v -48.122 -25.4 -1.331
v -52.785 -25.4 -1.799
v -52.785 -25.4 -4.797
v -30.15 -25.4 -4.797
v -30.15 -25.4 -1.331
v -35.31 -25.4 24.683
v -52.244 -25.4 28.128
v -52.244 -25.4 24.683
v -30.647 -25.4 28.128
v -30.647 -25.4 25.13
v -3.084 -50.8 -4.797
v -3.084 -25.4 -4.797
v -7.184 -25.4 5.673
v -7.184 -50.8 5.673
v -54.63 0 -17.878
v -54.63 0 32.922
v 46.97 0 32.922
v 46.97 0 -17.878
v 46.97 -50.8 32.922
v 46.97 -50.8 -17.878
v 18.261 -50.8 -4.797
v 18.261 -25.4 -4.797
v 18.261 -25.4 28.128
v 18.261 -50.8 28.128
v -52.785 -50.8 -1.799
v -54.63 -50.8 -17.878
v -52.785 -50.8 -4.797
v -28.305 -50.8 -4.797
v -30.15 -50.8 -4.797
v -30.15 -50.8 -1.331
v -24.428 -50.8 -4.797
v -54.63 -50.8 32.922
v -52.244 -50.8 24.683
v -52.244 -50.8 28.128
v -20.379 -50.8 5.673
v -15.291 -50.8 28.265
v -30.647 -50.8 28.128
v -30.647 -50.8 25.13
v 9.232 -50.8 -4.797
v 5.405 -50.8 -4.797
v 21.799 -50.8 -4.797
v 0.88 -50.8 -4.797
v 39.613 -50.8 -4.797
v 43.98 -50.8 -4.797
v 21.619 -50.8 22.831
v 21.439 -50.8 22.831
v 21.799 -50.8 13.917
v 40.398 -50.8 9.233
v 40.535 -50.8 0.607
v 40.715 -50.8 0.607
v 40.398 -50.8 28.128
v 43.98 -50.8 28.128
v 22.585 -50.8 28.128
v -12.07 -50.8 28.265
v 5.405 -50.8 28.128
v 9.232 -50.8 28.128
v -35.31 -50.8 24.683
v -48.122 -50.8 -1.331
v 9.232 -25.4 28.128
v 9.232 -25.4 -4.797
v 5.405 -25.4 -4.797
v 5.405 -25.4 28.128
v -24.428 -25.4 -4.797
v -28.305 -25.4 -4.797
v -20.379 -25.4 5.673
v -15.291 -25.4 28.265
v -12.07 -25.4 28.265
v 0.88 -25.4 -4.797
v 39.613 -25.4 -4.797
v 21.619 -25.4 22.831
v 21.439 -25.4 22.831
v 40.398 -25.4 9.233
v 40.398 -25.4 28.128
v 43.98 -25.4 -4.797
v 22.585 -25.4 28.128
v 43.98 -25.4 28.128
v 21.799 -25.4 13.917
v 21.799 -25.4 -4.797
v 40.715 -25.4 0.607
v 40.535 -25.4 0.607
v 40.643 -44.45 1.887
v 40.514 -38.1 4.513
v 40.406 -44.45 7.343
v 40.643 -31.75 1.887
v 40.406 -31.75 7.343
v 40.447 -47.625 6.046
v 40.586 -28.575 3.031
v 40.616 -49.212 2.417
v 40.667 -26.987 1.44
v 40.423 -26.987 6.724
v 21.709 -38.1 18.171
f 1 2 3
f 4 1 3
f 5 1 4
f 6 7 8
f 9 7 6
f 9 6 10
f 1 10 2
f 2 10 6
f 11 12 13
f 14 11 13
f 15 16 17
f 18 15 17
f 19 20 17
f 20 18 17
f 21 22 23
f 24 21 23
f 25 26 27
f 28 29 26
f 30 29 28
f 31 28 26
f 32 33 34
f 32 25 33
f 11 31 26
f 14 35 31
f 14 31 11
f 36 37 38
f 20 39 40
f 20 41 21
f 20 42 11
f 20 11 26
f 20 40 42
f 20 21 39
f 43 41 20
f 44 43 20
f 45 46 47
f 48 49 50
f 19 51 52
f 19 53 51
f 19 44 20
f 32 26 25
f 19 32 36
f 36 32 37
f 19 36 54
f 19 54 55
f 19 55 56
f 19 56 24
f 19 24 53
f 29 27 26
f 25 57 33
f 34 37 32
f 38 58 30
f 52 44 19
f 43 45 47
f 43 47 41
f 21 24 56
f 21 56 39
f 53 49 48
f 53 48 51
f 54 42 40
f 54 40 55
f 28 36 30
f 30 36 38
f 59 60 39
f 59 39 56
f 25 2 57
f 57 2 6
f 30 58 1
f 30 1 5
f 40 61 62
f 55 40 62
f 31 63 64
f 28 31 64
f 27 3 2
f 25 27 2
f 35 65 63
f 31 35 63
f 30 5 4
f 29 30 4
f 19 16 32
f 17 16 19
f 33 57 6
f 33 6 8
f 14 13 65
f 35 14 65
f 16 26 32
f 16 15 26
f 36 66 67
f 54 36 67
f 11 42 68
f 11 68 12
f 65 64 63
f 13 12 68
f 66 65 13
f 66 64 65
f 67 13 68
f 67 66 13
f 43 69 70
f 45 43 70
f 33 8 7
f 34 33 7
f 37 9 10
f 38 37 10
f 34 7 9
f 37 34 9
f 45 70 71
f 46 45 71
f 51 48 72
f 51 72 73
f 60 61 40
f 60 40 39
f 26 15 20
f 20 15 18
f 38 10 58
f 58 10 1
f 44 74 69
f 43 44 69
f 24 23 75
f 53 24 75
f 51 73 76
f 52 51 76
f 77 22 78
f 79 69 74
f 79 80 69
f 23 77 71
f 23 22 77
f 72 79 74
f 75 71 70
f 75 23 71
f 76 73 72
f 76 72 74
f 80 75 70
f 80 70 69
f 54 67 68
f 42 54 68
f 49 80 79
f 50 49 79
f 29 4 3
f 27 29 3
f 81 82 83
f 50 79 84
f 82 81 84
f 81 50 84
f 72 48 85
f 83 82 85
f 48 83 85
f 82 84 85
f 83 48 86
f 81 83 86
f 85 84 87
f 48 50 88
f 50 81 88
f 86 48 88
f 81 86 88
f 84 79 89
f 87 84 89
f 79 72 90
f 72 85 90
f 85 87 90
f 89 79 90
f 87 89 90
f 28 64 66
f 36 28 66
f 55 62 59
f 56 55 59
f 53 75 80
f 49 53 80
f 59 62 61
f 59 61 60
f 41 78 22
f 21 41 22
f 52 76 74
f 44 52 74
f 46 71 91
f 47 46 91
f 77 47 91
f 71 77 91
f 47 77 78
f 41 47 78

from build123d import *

# Parameters (mm, degrees)
F0_W     = 101.6
F0_H     = 50.8000018598
F1_DEPTH = 25.4
F2_W     = 101.6
F2_H     = 50.8000018598
F2_W_2   = 3.8264841478
F2_H_2   = 32.9250585148
F3_DEPTH = 25.4


with BuildPart() as f1:
    # F0 (on Front) → F1 (new body)
    with BuildSketch(Plane.XZ):
        with Locations((-3.8295406848, 7.522309199)):
            Rectangle(F0_W, F0_H)
    extrude(amount=F1_DEPTH)

    # F2 (on face) → F3 (join)
    with BuildSketch(Plane.XZ.offset(25.4)):
        with Locations((-3.8295406848, 7.522309199)):
            Rectangle(F2_W, F2_H)
        Polygon((-30.1501307976, -1.3310039), (-30.1501307976, -4.797178806), (-52.7847573669, -4.797178806), (-52.7847573669, -1.7994059143), (-35.30975914, 24.6833233572), (-52.2442935042, 24.6833233572), (-52.2442935042, 28.1278797087), (-30.6473575513, 28.1278797087), (-30.6473575513, 25.1301068171), (-48.1223557781, -1.3310039), align=None, mode=Mode.SUBTRACT)
        Polygon((0.8797011054, -4.797178806), (-3.0837005543, -4.797178806), (-7.1840197259, 5.6734077604), (-20.3785441602, 5.6734077604), (-24.428420038, -4.797178806), (-28.3053474796, -4.797178806), (-15.2909776662, 28.2647972206), (-12.0698130446, 28.2647972206), align=None, mode=Mode.SUBTRACT)
        with Locations((7.3184272562, 11.6653504514)):
            Rectangle(F2_W_2, F2_H_2, mode=Mode.SUBTRACT)
        with BuildLine():
            Line((43.9798926083, 28.1278797087), (43.9798926083, -4.797178806))
            Line((43.9798926083, -4.797178806), (39.6129445978, -4.797178806))
            Line((39.6129445978, -4.797178806), (21.6191010628, 22.8313338544))
            Line((21.6191010628, 22.8313338544), (21.4389464419, 22.8313338544))
            add(Edge.make_bspline(
                [(21.4389464419, 22.8313338544), (21.7992556837, 17.9671590903), (21.7992556837, 13.9172832125)],
                knots=[0, 0, 0, 1, 1, 1], degree=2))
            Line((21.7992556837, 13.9172832125), (21.7992556837, -4.797178806))
            Line((21.7992556837, -4.797178806), (18.2610189293, -4.797178806))
            Line((18.2610189293, -4.797178806), (18.2610189293, 28.1278797087))
            Line((18.2610189293, 28.1278797087), (22.5847298308, 28.1278797087))
            Line((22.5847298308, 28.1278797087), (40.5353362568, 0.6074598208))
            Line((40.5353362568, 0.6074598208), (40.7154908777, 0.6074598208))
            add(Edge.make_bspline(
                [(40.7154908777, 0.6074598208), (40.6722537687, 1.212779347), (40.5137177023, 4.5132120018)],
                knots=[0, 0, 0, 1, 1, 1], degree=2))
            add(Edge.make_bspline(
                [(40.5137177023, 4.5132120018), (40.3551816359, 7.8136446566), (40.3984187449, 9.2332630693)],
                knots=[0, 0, 0, 1, 1, 1], degree=2))
            Line((40.3984187449, 9.2332630693), (40.3984187449, 28.1278797087))
            Line((40.3984187449, 28.1278797087), (43.9798926083, 28.1278797087))
        make_face(mode=Mode.SUBTRACT)
    extrude(amount=F3_DEPTH)


solid = f1.part
